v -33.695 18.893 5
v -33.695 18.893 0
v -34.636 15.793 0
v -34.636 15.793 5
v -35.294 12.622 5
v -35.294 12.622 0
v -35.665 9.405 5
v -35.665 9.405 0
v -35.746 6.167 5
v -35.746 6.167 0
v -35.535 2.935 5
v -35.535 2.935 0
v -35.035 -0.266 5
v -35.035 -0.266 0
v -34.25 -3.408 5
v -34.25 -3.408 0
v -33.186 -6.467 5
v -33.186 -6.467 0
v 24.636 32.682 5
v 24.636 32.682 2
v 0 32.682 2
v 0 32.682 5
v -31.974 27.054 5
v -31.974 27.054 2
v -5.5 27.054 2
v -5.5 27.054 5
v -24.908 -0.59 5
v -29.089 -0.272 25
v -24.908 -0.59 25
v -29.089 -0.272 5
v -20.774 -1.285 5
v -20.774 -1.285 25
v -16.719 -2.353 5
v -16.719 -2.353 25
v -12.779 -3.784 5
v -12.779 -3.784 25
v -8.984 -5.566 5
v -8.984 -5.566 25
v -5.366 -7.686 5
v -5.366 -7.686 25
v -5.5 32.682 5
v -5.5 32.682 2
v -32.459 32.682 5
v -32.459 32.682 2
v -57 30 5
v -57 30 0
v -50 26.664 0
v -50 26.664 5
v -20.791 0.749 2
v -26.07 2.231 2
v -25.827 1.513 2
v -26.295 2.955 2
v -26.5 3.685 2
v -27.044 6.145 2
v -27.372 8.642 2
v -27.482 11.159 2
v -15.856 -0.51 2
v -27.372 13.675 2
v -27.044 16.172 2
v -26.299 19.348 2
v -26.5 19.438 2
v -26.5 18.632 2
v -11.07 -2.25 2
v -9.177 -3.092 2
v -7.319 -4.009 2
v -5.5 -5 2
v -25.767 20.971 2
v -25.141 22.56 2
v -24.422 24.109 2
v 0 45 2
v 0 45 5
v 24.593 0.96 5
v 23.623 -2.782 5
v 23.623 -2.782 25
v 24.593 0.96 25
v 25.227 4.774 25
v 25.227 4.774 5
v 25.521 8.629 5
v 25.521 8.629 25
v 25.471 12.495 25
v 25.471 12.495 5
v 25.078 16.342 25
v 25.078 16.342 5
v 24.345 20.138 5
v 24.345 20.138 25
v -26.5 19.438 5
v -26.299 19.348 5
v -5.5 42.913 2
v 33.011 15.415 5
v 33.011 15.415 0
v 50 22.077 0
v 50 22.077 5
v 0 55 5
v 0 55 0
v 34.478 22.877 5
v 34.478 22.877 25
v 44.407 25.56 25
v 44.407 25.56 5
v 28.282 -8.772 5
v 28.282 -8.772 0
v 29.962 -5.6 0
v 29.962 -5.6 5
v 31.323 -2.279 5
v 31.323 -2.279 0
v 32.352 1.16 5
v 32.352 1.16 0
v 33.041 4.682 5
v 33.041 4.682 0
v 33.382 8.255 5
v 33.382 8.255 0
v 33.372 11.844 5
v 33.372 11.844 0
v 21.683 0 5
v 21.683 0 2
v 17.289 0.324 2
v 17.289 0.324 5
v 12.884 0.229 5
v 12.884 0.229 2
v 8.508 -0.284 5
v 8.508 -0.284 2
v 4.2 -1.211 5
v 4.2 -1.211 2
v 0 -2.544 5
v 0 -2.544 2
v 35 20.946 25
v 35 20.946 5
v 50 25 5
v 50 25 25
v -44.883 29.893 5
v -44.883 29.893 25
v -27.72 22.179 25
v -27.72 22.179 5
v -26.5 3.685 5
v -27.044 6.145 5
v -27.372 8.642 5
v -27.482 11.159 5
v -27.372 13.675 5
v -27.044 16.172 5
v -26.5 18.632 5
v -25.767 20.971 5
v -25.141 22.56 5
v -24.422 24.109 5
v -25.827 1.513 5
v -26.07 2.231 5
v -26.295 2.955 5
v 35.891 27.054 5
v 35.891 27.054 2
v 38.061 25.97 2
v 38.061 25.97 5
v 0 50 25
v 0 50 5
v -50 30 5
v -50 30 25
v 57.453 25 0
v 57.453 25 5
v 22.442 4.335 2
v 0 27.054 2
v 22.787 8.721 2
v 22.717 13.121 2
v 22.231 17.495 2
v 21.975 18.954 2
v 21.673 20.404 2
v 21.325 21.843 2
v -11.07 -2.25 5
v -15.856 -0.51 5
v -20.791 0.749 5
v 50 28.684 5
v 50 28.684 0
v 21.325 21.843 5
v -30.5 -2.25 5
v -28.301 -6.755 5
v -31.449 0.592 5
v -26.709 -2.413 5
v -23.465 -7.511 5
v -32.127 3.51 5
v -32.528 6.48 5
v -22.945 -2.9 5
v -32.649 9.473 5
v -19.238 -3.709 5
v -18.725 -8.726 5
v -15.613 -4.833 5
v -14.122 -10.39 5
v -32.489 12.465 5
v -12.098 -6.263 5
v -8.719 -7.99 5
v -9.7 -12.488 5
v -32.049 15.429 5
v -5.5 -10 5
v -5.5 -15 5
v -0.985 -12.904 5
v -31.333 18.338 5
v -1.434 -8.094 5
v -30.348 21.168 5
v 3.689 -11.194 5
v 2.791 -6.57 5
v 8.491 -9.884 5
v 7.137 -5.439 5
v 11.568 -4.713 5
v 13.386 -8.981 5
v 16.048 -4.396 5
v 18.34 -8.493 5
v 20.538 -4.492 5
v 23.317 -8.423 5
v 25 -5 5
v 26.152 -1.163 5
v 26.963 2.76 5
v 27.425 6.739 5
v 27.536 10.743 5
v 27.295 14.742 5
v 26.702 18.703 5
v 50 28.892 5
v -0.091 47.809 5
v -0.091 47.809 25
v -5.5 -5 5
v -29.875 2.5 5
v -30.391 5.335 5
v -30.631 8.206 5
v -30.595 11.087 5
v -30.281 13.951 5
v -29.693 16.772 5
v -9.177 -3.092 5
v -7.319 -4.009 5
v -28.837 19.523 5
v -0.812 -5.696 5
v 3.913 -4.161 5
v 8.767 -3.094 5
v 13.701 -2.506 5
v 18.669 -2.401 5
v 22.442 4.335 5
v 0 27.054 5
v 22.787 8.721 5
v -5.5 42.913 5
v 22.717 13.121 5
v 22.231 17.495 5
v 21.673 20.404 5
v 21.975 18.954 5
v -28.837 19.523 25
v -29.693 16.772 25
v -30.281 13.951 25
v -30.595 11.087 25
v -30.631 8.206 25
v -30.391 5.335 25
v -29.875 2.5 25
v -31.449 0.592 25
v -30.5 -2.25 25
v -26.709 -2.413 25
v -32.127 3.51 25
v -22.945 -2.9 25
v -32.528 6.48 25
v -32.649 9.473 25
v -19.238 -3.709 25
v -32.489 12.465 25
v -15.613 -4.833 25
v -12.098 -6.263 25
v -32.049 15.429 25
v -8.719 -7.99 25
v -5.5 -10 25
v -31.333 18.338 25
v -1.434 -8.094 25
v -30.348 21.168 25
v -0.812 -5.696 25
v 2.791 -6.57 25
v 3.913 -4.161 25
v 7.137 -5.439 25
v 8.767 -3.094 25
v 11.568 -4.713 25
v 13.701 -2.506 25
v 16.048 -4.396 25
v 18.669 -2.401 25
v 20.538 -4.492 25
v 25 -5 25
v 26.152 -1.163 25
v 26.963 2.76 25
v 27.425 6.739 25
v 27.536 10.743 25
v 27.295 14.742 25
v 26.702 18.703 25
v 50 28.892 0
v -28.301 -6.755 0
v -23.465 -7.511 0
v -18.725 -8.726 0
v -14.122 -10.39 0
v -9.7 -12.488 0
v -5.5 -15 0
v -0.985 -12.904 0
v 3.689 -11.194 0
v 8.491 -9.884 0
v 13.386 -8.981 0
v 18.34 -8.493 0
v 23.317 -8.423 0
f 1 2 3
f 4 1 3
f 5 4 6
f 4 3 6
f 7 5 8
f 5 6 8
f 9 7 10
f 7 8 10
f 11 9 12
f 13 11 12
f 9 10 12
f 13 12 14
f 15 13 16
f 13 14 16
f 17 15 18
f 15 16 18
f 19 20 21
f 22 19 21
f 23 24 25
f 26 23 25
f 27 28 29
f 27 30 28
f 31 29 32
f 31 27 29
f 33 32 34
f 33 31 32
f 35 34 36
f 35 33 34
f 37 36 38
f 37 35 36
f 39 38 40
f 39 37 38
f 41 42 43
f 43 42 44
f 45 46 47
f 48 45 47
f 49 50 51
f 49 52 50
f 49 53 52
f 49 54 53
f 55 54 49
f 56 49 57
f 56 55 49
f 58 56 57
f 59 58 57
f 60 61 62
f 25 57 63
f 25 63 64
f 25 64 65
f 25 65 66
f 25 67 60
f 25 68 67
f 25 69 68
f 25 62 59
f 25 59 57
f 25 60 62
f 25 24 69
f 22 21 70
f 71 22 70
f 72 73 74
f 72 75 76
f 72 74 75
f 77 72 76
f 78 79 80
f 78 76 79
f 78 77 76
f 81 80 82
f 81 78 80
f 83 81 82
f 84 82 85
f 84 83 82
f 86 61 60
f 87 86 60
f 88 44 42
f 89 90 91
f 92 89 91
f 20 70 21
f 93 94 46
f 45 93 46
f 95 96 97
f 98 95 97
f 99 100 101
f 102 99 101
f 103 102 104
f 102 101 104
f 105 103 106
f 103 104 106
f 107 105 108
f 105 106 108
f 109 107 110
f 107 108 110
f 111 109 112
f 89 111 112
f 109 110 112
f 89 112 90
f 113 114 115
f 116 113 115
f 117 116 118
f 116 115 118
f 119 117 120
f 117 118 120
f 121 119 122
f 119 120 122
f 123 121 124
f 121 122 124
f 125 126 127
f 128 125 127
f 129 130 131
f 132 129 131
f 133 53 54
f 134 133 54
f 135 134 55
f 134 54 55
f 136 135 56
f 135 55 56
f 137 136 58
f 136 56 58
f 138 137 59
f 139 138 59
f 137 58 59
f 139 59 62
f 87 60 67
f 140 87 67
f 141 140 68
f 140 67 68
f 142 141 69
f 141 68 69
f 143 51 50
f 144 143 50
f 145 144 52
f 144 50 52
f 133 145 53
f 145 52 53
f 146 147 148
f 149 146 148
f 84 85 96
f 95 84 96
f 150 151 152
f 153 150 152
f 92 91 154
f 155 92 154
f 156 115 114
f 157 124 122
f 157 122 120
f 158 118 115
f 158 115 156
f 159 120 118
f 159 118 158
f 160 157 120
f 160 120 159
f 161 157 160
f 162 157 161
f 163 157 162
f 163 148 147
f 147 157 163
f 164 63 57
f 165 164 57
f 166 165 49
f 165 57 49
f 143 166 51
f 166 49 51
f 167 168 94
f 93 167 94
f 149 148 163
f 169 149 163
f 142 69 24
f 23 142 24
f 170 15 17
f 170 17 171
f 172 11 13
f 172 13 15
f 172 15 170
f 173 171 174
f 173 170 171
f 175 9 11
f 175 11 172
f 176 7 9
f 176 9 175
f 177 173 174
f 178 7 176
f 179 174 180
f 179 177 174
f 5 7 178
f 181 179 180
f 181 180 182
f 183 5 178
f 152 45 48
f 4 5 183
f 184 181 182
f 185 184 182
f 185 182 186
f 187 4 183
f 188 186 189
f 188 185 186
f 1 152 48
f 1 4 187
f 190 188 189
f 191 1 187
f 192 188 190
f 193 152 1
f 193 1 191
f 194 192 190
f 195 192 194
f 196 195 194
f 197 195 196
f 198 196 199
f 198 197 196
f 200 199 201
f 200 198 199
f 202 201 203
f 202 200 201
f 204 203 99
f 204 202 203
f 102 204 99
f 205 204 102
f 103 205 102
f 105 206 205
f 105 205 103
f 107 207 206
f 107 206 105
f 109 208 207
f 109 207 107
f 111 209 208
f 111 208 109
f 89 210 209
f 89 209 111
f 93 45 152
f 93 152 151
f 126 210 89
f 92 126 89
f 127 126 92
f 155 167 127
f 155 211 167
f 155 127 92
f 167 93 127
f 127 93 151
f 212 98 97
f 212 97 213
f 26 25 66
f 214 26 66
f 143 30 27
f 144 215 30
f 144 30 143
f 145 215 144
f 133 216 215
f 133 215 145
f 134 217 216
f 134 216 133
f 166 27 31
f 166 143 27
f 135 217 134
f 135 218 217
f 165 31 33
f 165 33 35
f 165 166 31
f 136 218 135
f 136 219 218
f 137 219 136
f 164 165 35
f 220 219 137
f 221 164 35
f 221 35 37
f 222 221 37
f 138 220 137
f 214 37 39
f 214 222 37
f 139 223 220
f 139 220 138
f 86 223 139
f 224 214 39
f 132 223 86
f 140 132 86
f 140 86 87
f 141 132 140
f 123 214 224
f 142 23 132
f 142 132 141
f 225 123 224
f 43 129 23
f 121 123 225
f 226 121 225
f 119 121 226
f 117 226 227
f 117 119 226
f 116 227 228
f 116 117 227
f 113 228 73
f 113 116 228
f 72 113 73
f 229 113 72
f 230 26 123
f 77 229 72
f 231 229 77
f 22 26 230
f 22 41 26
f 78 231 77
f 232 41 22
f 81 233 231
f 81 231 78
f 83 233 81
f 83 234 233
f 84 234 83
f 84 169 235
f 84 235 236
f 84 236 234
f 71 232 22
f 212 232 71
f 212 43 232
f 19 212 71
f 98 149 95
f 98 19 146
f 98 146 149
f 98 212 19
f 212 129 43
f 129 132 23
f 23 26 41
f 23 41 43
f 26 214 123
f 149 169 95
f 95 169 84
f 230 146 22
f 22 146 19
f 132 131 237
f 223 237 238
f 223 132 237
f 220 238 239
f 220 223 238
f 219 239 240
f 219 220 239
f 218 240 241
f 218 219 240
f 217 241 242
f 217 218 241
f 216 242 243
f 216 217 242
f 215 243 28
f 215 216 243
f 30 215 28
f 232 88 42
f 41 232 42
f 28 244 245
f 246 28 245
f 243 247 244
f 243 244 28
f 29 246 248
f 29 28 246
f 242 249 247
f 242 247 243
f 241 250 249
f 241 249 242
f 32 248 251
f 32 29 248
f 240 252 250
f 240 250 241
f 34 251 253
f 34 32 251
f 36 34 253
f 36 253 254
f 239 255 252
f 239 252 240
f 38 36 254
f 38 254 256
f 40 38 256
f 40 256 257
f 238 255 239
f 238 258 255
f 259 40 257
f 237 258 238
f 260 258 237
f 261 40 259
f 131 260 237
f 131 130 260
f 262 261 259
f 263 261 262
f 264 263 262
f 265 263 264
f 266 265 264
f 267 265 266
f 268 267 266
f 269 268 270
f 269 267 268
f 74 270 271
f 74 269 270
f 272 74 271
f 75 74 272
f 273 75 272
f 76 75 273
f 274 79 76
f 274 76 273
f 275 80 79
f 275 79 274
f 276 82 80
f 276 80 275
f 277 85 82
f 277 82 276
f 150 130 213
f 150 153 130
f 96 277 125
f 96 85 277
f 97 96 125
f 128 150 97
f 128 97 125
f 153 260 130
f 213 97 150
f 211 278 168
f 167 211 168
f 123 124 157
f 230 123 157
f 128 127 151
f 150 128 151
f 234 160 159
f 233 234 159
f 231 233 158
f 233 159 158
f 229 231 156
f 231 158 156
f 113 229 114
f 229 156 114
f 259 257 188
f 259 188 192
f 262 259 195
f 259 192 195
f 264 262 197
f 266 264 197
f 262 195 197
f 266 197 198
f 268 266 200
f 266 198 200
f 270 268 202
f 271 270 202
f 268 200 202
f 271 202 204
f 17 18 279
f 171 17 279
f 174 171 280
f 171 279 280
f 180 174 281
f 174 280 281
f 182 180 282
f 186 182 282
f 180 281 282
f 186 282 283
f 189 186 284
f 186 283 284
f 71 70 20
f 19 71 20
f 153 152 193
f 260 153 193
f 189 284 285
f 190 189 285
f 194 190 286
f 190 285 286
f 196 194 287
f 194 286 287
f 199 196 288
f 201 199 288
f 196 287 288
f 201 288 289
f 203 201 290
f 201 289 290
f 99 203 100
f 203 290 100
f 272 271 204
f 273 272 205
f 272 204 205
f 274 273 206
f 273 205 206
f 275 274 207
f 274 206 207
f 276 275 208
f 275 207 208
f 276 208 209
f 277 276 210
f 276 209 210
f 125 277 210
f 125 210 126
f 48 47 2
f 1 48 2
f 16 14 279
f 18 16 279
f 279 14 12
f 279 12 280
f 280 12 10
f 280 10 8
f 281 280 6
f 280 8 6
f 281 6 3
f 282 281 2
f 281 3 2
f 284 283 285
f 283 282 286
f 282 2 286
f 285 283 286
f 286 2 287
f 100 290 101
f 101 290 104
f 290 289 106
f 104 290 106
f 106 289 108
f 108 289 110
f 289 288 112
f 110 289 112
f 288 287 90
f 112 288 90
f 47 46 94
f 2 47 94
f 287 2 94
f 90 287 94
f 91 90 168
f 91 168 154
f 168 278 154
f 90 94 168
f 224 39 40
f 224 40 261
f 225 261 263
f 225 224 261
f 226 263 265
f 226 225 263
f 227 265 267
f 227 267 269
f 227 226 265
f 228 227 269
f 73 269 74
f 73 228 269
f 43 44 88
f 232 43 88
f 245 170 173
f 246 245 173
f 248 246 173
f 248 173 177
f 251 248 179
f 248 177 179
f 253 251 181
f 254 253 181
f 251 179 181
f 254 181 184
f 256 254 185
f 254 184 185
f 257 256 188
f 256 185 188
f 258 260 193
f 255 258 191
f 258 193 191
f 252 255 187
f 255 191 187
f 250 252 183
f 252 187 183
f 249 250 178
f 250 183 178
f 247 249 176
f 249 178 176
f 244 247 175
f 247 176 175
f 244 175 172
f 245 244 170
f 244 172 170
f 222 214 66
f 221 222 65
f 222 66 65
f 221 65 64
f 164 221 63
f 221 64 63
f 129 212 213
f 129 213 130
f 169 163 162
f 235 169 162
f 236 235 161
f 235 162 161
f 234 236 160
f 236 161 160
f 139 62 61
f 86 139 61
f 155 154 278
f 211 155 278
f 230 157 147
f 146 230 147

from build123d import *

# Parameters (mm, degrees)
F1_DEPTH = 25
F2_T     = -2
F3_DEPTH = 5


with BuildPart() as f1:
    # F0 (on Top) → F1 (new body)
    with BuildSketch(Plane.XY):
        with BuildLine():
            Line((50, 25), (0, 50))
            Line((0, 50), (-50, 30))
            Line((-50, 30), (-30.3478781134, 21.1675856689))
            ThreePointArc((-30.3478781134, 21.1675856689), (-32.6493723673, 9.4732493681), (-30.5, -2.25))
            Line((-30.5, -2.25), (-26.5, -2.25))
            Line((-26.5, -2.25), (-26.5, 3.6853529656))
            ThreePointArc((-26.5, 3.6853529656), (-27.4818472664, 11.1586005985), (-26.5, 18.6318482313))
            Line((-26.5, 18.6318482313), (-26.5, 19.4382022472))
            Line((-26.5, 19.4382022472), (-26.2986962157, 19.3477286363))
            ThreePointArc((-26.2986962157, 19.3477286363), (-25.4656340579, 21.7699494798), (-24.4215968996, 24.1089947522))
            Line((-24.4215968996, 24.1089947522), (-31.9740222767, 27.0544973761))
            Line((-31.9740222767, 27.0544973761), (-39.5264476538, 30))
            Line((-39.5264476538, 30), (-32.4590496756, 32.6820262372))
            Line((-32.4590496756, 32.6820262372), (-5.5, 42.9127899192))
            Line((-5.5, 42.9127899192), (0, 45))
            Line((0, 45), (24.6359475255, 32.6820262372))
            Line((24.6359475255, 32.6820262372), (35.8910052478, 27.0544973761))
            Line((35.8910052478, 27.0544973761), (38.0609311461, 25.9695344269))
            Line((38.0609311461, 25.9695344269), (34.1284329528, 25))
            Line((34.1284329528, 25), (25.6717936096, 22.915065036))
            ThreePointArc((25.6717936096, 22.915065036), (26.2373168575, 20.8214995062), (26.7024967211, 18.7033774922))
            Line((26.7024967211, 18.7033774922), (35, 20.9459459459))
            Line((35, 20.9459459459), (50, 25))
        make_face()
        with BuildLine():
            Line((-26.5, 3.6853529656), (-26.5, -2.25))
            Line((-26.5, -2.25), (-11.0695765548, -2.25))
            ThreePointArc((-11.0695765548, -2.25), (-18.3080653559, 0.1805256036), (-25.8265792788, 1.5128631071))
            ThreePointArc((-25.8265792788, 1.5128631071), (-26.1846465442, 2.5924878985), (-26.5, 3.6853529656))
        make_face()
        with BuildLine():
            ThreePointArc((25, -5), (27.4252333214, 6.7386371679), (26.7024967211, 18.7033774922))
            Line((26.7024967211, 18.7033774922), (22.2313324849, 17.4949547256))
            ThreePointArc((22.2313324849, 17.4949547256), (22.7872104866, 8.7214855275), (21.6833752096, 0))
            ThreePointArc((21.6833752096, 0), (10.6895547346, 0.0246300535), (0, -2.5440495396))
            ThreePointArc((0, -2.5440495396), (-2.7899905559, -3.6824675653), (-5.5, -5))
            Line((-5.5, -5), (-5.5, -10))
            ThreePointArc((-5.5, -10), (9.3443058496, -5.0252656824), (25, -5))
        make_face()
        with BuildLine():
            Line((-26.5, -2.25), (-30.5, -2.25))
            ThreePointArc((-30.5, -2.25), (-17.4131506848, -4.2319376927), (-5.5, -10))
            Line((-5.5, -10), (-5.5, -5))
            ThreePointArc((-5.5, -5), (-8.2432452262, -3.5408628349), (-11.0695765548, -2.25))
            Line((-11.0695765548, -2.25), (-26.5, -2.25))
        make_face()
        with BuildLine():
            Line((-5.5, -2.25), (-11.0695765548, -2.25))
            ThreePointArc((-11.0695765548, -2.25), (-8.2432452262, -3.5408628349), (-5.5, -5))
            Line((-5.5, -5), (-5.5, -2.25))
        make_face()
        with BuildLine():
            Line((-5.5, -2.25), (-5.5, -5))
            ThreePointArc((-5.5, -5), (-2.7899905559, -3.6824675653), (0, -2.5440495396))
            Line((0, -2.5440495396), (0, 10))
            Line((0, 10), (0, 15))
            Line((0, 15), (0, 25))
            Line((0, 25), (0, 27.0544973761))
            Line((0, 27.0544973761), (0, 30))
            Line((0, 30), (0, 32.6820262372))
            Line((0, 32.6820262372), (0, 45))
            Line((0, 45), (-5.5, 42.9127899192))
            Line((-5.5, 42.9127899192), (-5.5, 32.6820262372))
            Line((-5.5, 32.6820262372), (-32.4590496756, 32.6820262372))
            Line((-32.4590496756, 32.6820262372), (-39.5264476538, 30))
            Line((-39.5264476538, 30), (-31.9740222767, 27.0544973761))
            Line((-31.9740222767, 27.0544973761), (-5.5, 27.0544973761))
            Line((-5.5, 27.0544973761), (-5.5, -2.25))
        make_face()
        with BuildLine():
            Line((21.3245172054, 21.8432694674), (25.6717936096, 22.915065036))
            Line((25.6717936096, 22.915065036), (34.1284329528, 25))
            Line((34.1284329528, 25), (38.0609311461, 25.9695344269))
            Line((38.0609311461, 25.9695344269), (35.8910052478, 27.0544973761))
            Line((35.8910052478, 27.0544973761), (0, 27.0544973761))
            Line((0, 27.0544973761), (0, 25))
            Line((0, 25), (0, 15))
            Line((0, 15), (0, 10))
            Line((0, 10), (0, -2.5440495396))
            ThreePointArc((0, -2.5440495396), (10.6895547346, 0.0246300535), (21.6833752096, 0))
            ThreePointArc((21.6833752096, 0), (22.7872104866, 8.7214855275), (22.2313324849, 17.4949547256))
            ThreePointArc((22.2313324849, 17.4949547256), (21.8298295871, 19.6799365229), (21.3245172054, 21.8432694674))
        make_face()
        with BuildLine():
            Line((22.2313324849, 17.4949547256), (26.7024967211, 18.7033774922))
            ThreePointArc((26.7024967211, 18.7033774922), (26.2373168575, 20.8214995062), (25.6717936096, 22.915065036))
            Line((25.6717936096, 22.915065036), (21.3245172054, 21.8432694674))
            ThreePointArc((21.3245172054, 21.8432694674), (21.8298295871, 19.6799365229), (22.2313324849, 17.4949547256))
        make_face()
        Polygon((0, 27.0544973761), (35.8910052478, 27.0544973761), (24.6359475255, 32.6820262372), (0, 32.6820262372), (0, 30), align=None)
        Polygon((0, 32.6820262372), (24.6359475255, 32.6820262372), (0, 45), align=None)
        Polygon((-5.5, 32.6820262372), (-5.5, 42.9127899192), (-32.4590496756, 32.6820262372), align=None)
        with BuildLine():
            ThreePointArc((-25.8265792788, 1.5128631071), (-18.3080653559, 0.1805256036), (-11.0695765548, -2.25))
            Line((-11.0695765548, -2.25), (-5.5, -2.25))
            Line((-5.5, -2.25), (-5.5, 27.0544973761))
            Line((-5.5, 27.0544973761), (-31.9740222767, 27.0544973761))
            Line((-31.9740222767, 27.0544973761), (-24.4215968996, 24.1089947522))
            ThreePointArc((-24.4215968996, 24.1089947522), (-25.4656340579, 21.7699494798), (-26.2986962157, 19.3477286363))
            ThreePointArc((-26.2986962157, 19.3477286363), (-26.4016482615, 18.9904352313), (-26.5, 18.6318482313))
            ThreePointArc((-26.5, 18.6318482313), (-27.4818472664, 11.1586005985), (-26.5, 3.6853529656))
            ThreePointArc((-26.5, 3.6853529656), (-26.1846465442, 2.5924878985), (-25.8265792788, 1.5128631071))
        make_face()
        with BuildLine():
            Line((-26.5, 19.4382022472), (-26.5, 18.6318482313))
            ThreePointArc((-26.5, 18.6318482313), (-26.4016482615, 18.9904352313), (-26.2986962157, 19.3477286363))
            Line((-26.2986962157, 19.3477286363), (-26.5, 19.4382022472))
        make_face()
    extrude(amount=F1_DEPTH)

    # F2
    f2_openings = [f1.faces().sort_by_distance(p)[0] for p in [
        (-1.454466, 20.176979, 25),
    ]]
    offset(amount=F2_T, openings=f2_openings, kind=Kind.INTERSECTION)

    # F0 (on Top) → F3 (join)
    with BuildSketch(Plane.XY):
        with BuildLine():
            Line((50, 22.0773804358), (50, 25))
            Line((50, 25), (35, 20.9459459459))
            Line((35, 20.9459459459), (26.7024967211, 18.7033774922))
            ThreePointArc((26.7024967211, 18.7033774922), (27.4252333214, 6.7386371679), (25, -5))
            ThreePointArc((25, -5), (9.3443058496, -5.0252656824), (-5.5, -10))
            Line((-5.5, -10), (-5.5, -15))
            ThreePointArc((-5.5, -15), (10.9294258994, -9.3812200513), (28.2823865676, -8.7717288371))
            ThreePointArc((28.2823865676, -8.7717288371), (32.739691971, 2.91239876), (33.0105349422, 15.4149206355))
            Line((33.0105349422, 15.4149206355), (50, 22.0773804358))
        make_face()
        Polygon((50, 28.6842105263), (9.5, 50), (0, 50), (50, 25), align=None)
        Polygon((0, 50), (9.5, 50), (0, 55), (-11.4, 50), align=None)
        Polygon((-50, 30), (0, 50), (-11.4, 50), (-50, 33.0701754386), align=None)
        Polygon((-50, 26.6638008012), (-50, 30), (-50, 33.0701754386), (-57, 30), align=None)
        with BuildLine():
            Line((-30.3478781134, 21.1675856689), (-50, 30))
            Line((-50, 30), (-50, 26.6638008012))
            Line((-50, 26.6638008012), (-33.6950486526, 18.8928628554))
            ThreePointArc((-33.6950486526, 18.8928628554), (-35.7455733347, 6.1667010563), (-33.1864199092, -6.467007004))
            ThreePointArc((-33.1864199092, -6.467007004), (-18.7245752181, -8.7262616008), (-5.5, -15))
            Line((-5.5, -15), (-5.5, -10))
            ThreePointArc((-5.5, -10), (-17.4131506848, -4.2319376927), (-30.5, -2.25))
            ThreePointArc((-30.5, -2.25), (-32.6493723673, 9.4732493681), (-30.3478781134, 21.1675856689))
        make_face()
        with BuildLine():
            ThreePointArc((25, -5), (27.4252333214, 6.7386371679), (26.7024967211, 18.7033774922))
            Line((26.7024967211, 18.7033774922), (22.2313324849, 17.4949547256))
            ThreePointArc((22.2313324849, 17.4949547256), (22.7872104866, 8.7214855275), (21.6833752096, 0))
            ThreePointArc((21.6833752096, 0), (10.6895547346, 0.0246300535), (0, -2.5440495396))
            ThreePointArc((0, -2.5440495396), (-2.7899905559, -3.6824675653), (-5.5, -5))
            Line((-5.5, -5), (-5.5, -10))
            ThreePointArc((-5.5, -10), (9.3443058496, -5.0252656824), (25, -5))
        make_face()
        with BuildLine():
            Line((-26.5, -2.25), (-30.5, -2.25))
            ThreePointArc((-30.5, -2.25), (-17.4131506848, -4.2319376927), (-5.5, -10))
            Line((-5.5, -10), (-5.5, -5))
            ThreePointArc((-5.5, -5), (-8.2432452262, -3.5408628349), (-11.0695765548, -2.25))
            Line((-11.0695765548, -2.25), (-26.5, -2.25))
        make_face()
        with BuildLine():
            Line((-26.5, 3.6853529656), (-26.5, -2.25))
            Line((-26.5, -2.25), (-11.0695765548, -2.25))
            ThreePointArc((-11.0695765548, -2.25), (-18.3080653559, 0.1805256036), (-25.8265792788, 1.5128631071))
            ThreePointArc((-25.8265792788, 1.5128631071), (-26.1846465442, 2.5924878985), (-26.5, 3.6853529656))
        make_face()
        with BuildLine():
            Line((50, 25), (0, 50))
            Line((0, 50), (-50, 30))
            Line((-50, 30), (-30.3478781134, 21.1675856689))
            ThreePointArc((-30.3478781134, 21.1675856689), (-32.6493723673, 9.4732493681), (-30.5, -2.25))
            Line((-30.5, -2.25), (-26.5, -2.25))
            Line((-26.5, -2.25), (-26.5, 3.6853529656))
            ThreePointArc((-26.5, 3.6853529656), (-27.4818472664, 11.1586005985), (-26.5, 18.6318482313))
            Line((-26.5, 18.6318482313), (-26.5, 19.4382022472))
            Line((-26.5, 19.4382022472), (-26.2986962157, 19.3477286363))
            ThreePointArc((-26.2986962157, 19.3477286363), (-25.4656340579, 21.7699494798), (-24.4215968996, 24.1089947522))
            Line((-24.4215968996, 24.1089947522), (-31.9740222767, 27.0544973761))
            Line((-31.9740222767, 27.0544973761), (-39.5264476538, 30))
            Line((-39.5264476538, 30), (-32.4590496756, 32.6820262372))
            Line((-32.4590496756, 32.6820262372), (-5.5, 42.9127899192))
            Line((-5.5, 42.9127899192), (0, 45))
            Line((0, 45), (24.6359475255, 32.6820262372))
            Line((24.6359475255, 32.6820262372), (35.8910052478, 27.0544973761))
            Line((35.8910052478, 27.0544973761), (38.0609311461, 25.9695344269))
            Line((38.0609311461, 25.9695344269), (34.1284329528, 25))
            Line((34.1284329528, 25), (25.6717936096, 22.915065036))
            ThreePointArc((25.6717936096, 22.915065036), (26.2373168575, 20.8214995062), (26.7024967211, 18.7033774922))
            Line((26.7024967211, 18.7033774922), (35, 20.9459459459))
            Line((35, 20.9459459459), (50, 25))
        make_face()
        with BuildLine():
            Line((22.2313324849, 17.4949547256), (26.7024967211, 18.7033774922))
            ThreePointArc((26.7024967211, 18.7033774922), (26.2373168575, 20.8214995062), (25.6717936096, 22.915065036))
            Line((25.6717936096, 22.915065036), (21.3245172054, 21.8432694674))
            ThreePointArc((21.3245172054, 21.8432694674), (21.8298295871, 19.6799365229), (22.2313324849, 17.4949547256))
        make_face()
        with BuildLine():
            Line((-5.5, -2.25), (-5.5, -5))
            ThreePointArc((-5.5, -5), (-2.7899905559, -3.6824675653), (0, -2.5440495396))
            Line((0, -2.5440495396), (0, 10))
            Line((0, 10), (0, 15))
            Line((0, 15), (0, 25))
            Line((0, 25), (0, 27.0544973761))
            Line((0, 27.0544973761), (0, 30))
            Line((0, 30), (0, 32.6820262372))
            Line((0, 32.6820262372), (0, 45))
            Line((0, 45), (-5.5, 42.9127899192))
            Line((-5.5, 42.9127899192), (-5.5, 32.6820262372))
            Line((-5.5, 32.6820262372), (-32.4590496756, 32.6820262372))
            Line((-32.4590496756, 32.6820262372), (-39.5264476538, 30))
            Line((-39.5264476538, 30), (-31.9740222767, 27.0544973761))
            Line((-31.9740222767, 27.0544973761), (-5.5, 27.0544973761))
            Line((-5.5, 27.0544973761), (-5.5, -2.25))
        make_face()
        Polygon((0, 27.0544973761), (35.8910052478, 27.0544973761), (24.6359475255, 32.6820262372), (0, 32.6820262372), (0, 30), align=None)
        Polygon((57.4527643621, 25), (50, 28.8915957021), (50, 28.6842105263), (50, 25), (50, 22.0773804358), align=None)
    extrude(amount=F3_DEPTH)


solid = f1.part
